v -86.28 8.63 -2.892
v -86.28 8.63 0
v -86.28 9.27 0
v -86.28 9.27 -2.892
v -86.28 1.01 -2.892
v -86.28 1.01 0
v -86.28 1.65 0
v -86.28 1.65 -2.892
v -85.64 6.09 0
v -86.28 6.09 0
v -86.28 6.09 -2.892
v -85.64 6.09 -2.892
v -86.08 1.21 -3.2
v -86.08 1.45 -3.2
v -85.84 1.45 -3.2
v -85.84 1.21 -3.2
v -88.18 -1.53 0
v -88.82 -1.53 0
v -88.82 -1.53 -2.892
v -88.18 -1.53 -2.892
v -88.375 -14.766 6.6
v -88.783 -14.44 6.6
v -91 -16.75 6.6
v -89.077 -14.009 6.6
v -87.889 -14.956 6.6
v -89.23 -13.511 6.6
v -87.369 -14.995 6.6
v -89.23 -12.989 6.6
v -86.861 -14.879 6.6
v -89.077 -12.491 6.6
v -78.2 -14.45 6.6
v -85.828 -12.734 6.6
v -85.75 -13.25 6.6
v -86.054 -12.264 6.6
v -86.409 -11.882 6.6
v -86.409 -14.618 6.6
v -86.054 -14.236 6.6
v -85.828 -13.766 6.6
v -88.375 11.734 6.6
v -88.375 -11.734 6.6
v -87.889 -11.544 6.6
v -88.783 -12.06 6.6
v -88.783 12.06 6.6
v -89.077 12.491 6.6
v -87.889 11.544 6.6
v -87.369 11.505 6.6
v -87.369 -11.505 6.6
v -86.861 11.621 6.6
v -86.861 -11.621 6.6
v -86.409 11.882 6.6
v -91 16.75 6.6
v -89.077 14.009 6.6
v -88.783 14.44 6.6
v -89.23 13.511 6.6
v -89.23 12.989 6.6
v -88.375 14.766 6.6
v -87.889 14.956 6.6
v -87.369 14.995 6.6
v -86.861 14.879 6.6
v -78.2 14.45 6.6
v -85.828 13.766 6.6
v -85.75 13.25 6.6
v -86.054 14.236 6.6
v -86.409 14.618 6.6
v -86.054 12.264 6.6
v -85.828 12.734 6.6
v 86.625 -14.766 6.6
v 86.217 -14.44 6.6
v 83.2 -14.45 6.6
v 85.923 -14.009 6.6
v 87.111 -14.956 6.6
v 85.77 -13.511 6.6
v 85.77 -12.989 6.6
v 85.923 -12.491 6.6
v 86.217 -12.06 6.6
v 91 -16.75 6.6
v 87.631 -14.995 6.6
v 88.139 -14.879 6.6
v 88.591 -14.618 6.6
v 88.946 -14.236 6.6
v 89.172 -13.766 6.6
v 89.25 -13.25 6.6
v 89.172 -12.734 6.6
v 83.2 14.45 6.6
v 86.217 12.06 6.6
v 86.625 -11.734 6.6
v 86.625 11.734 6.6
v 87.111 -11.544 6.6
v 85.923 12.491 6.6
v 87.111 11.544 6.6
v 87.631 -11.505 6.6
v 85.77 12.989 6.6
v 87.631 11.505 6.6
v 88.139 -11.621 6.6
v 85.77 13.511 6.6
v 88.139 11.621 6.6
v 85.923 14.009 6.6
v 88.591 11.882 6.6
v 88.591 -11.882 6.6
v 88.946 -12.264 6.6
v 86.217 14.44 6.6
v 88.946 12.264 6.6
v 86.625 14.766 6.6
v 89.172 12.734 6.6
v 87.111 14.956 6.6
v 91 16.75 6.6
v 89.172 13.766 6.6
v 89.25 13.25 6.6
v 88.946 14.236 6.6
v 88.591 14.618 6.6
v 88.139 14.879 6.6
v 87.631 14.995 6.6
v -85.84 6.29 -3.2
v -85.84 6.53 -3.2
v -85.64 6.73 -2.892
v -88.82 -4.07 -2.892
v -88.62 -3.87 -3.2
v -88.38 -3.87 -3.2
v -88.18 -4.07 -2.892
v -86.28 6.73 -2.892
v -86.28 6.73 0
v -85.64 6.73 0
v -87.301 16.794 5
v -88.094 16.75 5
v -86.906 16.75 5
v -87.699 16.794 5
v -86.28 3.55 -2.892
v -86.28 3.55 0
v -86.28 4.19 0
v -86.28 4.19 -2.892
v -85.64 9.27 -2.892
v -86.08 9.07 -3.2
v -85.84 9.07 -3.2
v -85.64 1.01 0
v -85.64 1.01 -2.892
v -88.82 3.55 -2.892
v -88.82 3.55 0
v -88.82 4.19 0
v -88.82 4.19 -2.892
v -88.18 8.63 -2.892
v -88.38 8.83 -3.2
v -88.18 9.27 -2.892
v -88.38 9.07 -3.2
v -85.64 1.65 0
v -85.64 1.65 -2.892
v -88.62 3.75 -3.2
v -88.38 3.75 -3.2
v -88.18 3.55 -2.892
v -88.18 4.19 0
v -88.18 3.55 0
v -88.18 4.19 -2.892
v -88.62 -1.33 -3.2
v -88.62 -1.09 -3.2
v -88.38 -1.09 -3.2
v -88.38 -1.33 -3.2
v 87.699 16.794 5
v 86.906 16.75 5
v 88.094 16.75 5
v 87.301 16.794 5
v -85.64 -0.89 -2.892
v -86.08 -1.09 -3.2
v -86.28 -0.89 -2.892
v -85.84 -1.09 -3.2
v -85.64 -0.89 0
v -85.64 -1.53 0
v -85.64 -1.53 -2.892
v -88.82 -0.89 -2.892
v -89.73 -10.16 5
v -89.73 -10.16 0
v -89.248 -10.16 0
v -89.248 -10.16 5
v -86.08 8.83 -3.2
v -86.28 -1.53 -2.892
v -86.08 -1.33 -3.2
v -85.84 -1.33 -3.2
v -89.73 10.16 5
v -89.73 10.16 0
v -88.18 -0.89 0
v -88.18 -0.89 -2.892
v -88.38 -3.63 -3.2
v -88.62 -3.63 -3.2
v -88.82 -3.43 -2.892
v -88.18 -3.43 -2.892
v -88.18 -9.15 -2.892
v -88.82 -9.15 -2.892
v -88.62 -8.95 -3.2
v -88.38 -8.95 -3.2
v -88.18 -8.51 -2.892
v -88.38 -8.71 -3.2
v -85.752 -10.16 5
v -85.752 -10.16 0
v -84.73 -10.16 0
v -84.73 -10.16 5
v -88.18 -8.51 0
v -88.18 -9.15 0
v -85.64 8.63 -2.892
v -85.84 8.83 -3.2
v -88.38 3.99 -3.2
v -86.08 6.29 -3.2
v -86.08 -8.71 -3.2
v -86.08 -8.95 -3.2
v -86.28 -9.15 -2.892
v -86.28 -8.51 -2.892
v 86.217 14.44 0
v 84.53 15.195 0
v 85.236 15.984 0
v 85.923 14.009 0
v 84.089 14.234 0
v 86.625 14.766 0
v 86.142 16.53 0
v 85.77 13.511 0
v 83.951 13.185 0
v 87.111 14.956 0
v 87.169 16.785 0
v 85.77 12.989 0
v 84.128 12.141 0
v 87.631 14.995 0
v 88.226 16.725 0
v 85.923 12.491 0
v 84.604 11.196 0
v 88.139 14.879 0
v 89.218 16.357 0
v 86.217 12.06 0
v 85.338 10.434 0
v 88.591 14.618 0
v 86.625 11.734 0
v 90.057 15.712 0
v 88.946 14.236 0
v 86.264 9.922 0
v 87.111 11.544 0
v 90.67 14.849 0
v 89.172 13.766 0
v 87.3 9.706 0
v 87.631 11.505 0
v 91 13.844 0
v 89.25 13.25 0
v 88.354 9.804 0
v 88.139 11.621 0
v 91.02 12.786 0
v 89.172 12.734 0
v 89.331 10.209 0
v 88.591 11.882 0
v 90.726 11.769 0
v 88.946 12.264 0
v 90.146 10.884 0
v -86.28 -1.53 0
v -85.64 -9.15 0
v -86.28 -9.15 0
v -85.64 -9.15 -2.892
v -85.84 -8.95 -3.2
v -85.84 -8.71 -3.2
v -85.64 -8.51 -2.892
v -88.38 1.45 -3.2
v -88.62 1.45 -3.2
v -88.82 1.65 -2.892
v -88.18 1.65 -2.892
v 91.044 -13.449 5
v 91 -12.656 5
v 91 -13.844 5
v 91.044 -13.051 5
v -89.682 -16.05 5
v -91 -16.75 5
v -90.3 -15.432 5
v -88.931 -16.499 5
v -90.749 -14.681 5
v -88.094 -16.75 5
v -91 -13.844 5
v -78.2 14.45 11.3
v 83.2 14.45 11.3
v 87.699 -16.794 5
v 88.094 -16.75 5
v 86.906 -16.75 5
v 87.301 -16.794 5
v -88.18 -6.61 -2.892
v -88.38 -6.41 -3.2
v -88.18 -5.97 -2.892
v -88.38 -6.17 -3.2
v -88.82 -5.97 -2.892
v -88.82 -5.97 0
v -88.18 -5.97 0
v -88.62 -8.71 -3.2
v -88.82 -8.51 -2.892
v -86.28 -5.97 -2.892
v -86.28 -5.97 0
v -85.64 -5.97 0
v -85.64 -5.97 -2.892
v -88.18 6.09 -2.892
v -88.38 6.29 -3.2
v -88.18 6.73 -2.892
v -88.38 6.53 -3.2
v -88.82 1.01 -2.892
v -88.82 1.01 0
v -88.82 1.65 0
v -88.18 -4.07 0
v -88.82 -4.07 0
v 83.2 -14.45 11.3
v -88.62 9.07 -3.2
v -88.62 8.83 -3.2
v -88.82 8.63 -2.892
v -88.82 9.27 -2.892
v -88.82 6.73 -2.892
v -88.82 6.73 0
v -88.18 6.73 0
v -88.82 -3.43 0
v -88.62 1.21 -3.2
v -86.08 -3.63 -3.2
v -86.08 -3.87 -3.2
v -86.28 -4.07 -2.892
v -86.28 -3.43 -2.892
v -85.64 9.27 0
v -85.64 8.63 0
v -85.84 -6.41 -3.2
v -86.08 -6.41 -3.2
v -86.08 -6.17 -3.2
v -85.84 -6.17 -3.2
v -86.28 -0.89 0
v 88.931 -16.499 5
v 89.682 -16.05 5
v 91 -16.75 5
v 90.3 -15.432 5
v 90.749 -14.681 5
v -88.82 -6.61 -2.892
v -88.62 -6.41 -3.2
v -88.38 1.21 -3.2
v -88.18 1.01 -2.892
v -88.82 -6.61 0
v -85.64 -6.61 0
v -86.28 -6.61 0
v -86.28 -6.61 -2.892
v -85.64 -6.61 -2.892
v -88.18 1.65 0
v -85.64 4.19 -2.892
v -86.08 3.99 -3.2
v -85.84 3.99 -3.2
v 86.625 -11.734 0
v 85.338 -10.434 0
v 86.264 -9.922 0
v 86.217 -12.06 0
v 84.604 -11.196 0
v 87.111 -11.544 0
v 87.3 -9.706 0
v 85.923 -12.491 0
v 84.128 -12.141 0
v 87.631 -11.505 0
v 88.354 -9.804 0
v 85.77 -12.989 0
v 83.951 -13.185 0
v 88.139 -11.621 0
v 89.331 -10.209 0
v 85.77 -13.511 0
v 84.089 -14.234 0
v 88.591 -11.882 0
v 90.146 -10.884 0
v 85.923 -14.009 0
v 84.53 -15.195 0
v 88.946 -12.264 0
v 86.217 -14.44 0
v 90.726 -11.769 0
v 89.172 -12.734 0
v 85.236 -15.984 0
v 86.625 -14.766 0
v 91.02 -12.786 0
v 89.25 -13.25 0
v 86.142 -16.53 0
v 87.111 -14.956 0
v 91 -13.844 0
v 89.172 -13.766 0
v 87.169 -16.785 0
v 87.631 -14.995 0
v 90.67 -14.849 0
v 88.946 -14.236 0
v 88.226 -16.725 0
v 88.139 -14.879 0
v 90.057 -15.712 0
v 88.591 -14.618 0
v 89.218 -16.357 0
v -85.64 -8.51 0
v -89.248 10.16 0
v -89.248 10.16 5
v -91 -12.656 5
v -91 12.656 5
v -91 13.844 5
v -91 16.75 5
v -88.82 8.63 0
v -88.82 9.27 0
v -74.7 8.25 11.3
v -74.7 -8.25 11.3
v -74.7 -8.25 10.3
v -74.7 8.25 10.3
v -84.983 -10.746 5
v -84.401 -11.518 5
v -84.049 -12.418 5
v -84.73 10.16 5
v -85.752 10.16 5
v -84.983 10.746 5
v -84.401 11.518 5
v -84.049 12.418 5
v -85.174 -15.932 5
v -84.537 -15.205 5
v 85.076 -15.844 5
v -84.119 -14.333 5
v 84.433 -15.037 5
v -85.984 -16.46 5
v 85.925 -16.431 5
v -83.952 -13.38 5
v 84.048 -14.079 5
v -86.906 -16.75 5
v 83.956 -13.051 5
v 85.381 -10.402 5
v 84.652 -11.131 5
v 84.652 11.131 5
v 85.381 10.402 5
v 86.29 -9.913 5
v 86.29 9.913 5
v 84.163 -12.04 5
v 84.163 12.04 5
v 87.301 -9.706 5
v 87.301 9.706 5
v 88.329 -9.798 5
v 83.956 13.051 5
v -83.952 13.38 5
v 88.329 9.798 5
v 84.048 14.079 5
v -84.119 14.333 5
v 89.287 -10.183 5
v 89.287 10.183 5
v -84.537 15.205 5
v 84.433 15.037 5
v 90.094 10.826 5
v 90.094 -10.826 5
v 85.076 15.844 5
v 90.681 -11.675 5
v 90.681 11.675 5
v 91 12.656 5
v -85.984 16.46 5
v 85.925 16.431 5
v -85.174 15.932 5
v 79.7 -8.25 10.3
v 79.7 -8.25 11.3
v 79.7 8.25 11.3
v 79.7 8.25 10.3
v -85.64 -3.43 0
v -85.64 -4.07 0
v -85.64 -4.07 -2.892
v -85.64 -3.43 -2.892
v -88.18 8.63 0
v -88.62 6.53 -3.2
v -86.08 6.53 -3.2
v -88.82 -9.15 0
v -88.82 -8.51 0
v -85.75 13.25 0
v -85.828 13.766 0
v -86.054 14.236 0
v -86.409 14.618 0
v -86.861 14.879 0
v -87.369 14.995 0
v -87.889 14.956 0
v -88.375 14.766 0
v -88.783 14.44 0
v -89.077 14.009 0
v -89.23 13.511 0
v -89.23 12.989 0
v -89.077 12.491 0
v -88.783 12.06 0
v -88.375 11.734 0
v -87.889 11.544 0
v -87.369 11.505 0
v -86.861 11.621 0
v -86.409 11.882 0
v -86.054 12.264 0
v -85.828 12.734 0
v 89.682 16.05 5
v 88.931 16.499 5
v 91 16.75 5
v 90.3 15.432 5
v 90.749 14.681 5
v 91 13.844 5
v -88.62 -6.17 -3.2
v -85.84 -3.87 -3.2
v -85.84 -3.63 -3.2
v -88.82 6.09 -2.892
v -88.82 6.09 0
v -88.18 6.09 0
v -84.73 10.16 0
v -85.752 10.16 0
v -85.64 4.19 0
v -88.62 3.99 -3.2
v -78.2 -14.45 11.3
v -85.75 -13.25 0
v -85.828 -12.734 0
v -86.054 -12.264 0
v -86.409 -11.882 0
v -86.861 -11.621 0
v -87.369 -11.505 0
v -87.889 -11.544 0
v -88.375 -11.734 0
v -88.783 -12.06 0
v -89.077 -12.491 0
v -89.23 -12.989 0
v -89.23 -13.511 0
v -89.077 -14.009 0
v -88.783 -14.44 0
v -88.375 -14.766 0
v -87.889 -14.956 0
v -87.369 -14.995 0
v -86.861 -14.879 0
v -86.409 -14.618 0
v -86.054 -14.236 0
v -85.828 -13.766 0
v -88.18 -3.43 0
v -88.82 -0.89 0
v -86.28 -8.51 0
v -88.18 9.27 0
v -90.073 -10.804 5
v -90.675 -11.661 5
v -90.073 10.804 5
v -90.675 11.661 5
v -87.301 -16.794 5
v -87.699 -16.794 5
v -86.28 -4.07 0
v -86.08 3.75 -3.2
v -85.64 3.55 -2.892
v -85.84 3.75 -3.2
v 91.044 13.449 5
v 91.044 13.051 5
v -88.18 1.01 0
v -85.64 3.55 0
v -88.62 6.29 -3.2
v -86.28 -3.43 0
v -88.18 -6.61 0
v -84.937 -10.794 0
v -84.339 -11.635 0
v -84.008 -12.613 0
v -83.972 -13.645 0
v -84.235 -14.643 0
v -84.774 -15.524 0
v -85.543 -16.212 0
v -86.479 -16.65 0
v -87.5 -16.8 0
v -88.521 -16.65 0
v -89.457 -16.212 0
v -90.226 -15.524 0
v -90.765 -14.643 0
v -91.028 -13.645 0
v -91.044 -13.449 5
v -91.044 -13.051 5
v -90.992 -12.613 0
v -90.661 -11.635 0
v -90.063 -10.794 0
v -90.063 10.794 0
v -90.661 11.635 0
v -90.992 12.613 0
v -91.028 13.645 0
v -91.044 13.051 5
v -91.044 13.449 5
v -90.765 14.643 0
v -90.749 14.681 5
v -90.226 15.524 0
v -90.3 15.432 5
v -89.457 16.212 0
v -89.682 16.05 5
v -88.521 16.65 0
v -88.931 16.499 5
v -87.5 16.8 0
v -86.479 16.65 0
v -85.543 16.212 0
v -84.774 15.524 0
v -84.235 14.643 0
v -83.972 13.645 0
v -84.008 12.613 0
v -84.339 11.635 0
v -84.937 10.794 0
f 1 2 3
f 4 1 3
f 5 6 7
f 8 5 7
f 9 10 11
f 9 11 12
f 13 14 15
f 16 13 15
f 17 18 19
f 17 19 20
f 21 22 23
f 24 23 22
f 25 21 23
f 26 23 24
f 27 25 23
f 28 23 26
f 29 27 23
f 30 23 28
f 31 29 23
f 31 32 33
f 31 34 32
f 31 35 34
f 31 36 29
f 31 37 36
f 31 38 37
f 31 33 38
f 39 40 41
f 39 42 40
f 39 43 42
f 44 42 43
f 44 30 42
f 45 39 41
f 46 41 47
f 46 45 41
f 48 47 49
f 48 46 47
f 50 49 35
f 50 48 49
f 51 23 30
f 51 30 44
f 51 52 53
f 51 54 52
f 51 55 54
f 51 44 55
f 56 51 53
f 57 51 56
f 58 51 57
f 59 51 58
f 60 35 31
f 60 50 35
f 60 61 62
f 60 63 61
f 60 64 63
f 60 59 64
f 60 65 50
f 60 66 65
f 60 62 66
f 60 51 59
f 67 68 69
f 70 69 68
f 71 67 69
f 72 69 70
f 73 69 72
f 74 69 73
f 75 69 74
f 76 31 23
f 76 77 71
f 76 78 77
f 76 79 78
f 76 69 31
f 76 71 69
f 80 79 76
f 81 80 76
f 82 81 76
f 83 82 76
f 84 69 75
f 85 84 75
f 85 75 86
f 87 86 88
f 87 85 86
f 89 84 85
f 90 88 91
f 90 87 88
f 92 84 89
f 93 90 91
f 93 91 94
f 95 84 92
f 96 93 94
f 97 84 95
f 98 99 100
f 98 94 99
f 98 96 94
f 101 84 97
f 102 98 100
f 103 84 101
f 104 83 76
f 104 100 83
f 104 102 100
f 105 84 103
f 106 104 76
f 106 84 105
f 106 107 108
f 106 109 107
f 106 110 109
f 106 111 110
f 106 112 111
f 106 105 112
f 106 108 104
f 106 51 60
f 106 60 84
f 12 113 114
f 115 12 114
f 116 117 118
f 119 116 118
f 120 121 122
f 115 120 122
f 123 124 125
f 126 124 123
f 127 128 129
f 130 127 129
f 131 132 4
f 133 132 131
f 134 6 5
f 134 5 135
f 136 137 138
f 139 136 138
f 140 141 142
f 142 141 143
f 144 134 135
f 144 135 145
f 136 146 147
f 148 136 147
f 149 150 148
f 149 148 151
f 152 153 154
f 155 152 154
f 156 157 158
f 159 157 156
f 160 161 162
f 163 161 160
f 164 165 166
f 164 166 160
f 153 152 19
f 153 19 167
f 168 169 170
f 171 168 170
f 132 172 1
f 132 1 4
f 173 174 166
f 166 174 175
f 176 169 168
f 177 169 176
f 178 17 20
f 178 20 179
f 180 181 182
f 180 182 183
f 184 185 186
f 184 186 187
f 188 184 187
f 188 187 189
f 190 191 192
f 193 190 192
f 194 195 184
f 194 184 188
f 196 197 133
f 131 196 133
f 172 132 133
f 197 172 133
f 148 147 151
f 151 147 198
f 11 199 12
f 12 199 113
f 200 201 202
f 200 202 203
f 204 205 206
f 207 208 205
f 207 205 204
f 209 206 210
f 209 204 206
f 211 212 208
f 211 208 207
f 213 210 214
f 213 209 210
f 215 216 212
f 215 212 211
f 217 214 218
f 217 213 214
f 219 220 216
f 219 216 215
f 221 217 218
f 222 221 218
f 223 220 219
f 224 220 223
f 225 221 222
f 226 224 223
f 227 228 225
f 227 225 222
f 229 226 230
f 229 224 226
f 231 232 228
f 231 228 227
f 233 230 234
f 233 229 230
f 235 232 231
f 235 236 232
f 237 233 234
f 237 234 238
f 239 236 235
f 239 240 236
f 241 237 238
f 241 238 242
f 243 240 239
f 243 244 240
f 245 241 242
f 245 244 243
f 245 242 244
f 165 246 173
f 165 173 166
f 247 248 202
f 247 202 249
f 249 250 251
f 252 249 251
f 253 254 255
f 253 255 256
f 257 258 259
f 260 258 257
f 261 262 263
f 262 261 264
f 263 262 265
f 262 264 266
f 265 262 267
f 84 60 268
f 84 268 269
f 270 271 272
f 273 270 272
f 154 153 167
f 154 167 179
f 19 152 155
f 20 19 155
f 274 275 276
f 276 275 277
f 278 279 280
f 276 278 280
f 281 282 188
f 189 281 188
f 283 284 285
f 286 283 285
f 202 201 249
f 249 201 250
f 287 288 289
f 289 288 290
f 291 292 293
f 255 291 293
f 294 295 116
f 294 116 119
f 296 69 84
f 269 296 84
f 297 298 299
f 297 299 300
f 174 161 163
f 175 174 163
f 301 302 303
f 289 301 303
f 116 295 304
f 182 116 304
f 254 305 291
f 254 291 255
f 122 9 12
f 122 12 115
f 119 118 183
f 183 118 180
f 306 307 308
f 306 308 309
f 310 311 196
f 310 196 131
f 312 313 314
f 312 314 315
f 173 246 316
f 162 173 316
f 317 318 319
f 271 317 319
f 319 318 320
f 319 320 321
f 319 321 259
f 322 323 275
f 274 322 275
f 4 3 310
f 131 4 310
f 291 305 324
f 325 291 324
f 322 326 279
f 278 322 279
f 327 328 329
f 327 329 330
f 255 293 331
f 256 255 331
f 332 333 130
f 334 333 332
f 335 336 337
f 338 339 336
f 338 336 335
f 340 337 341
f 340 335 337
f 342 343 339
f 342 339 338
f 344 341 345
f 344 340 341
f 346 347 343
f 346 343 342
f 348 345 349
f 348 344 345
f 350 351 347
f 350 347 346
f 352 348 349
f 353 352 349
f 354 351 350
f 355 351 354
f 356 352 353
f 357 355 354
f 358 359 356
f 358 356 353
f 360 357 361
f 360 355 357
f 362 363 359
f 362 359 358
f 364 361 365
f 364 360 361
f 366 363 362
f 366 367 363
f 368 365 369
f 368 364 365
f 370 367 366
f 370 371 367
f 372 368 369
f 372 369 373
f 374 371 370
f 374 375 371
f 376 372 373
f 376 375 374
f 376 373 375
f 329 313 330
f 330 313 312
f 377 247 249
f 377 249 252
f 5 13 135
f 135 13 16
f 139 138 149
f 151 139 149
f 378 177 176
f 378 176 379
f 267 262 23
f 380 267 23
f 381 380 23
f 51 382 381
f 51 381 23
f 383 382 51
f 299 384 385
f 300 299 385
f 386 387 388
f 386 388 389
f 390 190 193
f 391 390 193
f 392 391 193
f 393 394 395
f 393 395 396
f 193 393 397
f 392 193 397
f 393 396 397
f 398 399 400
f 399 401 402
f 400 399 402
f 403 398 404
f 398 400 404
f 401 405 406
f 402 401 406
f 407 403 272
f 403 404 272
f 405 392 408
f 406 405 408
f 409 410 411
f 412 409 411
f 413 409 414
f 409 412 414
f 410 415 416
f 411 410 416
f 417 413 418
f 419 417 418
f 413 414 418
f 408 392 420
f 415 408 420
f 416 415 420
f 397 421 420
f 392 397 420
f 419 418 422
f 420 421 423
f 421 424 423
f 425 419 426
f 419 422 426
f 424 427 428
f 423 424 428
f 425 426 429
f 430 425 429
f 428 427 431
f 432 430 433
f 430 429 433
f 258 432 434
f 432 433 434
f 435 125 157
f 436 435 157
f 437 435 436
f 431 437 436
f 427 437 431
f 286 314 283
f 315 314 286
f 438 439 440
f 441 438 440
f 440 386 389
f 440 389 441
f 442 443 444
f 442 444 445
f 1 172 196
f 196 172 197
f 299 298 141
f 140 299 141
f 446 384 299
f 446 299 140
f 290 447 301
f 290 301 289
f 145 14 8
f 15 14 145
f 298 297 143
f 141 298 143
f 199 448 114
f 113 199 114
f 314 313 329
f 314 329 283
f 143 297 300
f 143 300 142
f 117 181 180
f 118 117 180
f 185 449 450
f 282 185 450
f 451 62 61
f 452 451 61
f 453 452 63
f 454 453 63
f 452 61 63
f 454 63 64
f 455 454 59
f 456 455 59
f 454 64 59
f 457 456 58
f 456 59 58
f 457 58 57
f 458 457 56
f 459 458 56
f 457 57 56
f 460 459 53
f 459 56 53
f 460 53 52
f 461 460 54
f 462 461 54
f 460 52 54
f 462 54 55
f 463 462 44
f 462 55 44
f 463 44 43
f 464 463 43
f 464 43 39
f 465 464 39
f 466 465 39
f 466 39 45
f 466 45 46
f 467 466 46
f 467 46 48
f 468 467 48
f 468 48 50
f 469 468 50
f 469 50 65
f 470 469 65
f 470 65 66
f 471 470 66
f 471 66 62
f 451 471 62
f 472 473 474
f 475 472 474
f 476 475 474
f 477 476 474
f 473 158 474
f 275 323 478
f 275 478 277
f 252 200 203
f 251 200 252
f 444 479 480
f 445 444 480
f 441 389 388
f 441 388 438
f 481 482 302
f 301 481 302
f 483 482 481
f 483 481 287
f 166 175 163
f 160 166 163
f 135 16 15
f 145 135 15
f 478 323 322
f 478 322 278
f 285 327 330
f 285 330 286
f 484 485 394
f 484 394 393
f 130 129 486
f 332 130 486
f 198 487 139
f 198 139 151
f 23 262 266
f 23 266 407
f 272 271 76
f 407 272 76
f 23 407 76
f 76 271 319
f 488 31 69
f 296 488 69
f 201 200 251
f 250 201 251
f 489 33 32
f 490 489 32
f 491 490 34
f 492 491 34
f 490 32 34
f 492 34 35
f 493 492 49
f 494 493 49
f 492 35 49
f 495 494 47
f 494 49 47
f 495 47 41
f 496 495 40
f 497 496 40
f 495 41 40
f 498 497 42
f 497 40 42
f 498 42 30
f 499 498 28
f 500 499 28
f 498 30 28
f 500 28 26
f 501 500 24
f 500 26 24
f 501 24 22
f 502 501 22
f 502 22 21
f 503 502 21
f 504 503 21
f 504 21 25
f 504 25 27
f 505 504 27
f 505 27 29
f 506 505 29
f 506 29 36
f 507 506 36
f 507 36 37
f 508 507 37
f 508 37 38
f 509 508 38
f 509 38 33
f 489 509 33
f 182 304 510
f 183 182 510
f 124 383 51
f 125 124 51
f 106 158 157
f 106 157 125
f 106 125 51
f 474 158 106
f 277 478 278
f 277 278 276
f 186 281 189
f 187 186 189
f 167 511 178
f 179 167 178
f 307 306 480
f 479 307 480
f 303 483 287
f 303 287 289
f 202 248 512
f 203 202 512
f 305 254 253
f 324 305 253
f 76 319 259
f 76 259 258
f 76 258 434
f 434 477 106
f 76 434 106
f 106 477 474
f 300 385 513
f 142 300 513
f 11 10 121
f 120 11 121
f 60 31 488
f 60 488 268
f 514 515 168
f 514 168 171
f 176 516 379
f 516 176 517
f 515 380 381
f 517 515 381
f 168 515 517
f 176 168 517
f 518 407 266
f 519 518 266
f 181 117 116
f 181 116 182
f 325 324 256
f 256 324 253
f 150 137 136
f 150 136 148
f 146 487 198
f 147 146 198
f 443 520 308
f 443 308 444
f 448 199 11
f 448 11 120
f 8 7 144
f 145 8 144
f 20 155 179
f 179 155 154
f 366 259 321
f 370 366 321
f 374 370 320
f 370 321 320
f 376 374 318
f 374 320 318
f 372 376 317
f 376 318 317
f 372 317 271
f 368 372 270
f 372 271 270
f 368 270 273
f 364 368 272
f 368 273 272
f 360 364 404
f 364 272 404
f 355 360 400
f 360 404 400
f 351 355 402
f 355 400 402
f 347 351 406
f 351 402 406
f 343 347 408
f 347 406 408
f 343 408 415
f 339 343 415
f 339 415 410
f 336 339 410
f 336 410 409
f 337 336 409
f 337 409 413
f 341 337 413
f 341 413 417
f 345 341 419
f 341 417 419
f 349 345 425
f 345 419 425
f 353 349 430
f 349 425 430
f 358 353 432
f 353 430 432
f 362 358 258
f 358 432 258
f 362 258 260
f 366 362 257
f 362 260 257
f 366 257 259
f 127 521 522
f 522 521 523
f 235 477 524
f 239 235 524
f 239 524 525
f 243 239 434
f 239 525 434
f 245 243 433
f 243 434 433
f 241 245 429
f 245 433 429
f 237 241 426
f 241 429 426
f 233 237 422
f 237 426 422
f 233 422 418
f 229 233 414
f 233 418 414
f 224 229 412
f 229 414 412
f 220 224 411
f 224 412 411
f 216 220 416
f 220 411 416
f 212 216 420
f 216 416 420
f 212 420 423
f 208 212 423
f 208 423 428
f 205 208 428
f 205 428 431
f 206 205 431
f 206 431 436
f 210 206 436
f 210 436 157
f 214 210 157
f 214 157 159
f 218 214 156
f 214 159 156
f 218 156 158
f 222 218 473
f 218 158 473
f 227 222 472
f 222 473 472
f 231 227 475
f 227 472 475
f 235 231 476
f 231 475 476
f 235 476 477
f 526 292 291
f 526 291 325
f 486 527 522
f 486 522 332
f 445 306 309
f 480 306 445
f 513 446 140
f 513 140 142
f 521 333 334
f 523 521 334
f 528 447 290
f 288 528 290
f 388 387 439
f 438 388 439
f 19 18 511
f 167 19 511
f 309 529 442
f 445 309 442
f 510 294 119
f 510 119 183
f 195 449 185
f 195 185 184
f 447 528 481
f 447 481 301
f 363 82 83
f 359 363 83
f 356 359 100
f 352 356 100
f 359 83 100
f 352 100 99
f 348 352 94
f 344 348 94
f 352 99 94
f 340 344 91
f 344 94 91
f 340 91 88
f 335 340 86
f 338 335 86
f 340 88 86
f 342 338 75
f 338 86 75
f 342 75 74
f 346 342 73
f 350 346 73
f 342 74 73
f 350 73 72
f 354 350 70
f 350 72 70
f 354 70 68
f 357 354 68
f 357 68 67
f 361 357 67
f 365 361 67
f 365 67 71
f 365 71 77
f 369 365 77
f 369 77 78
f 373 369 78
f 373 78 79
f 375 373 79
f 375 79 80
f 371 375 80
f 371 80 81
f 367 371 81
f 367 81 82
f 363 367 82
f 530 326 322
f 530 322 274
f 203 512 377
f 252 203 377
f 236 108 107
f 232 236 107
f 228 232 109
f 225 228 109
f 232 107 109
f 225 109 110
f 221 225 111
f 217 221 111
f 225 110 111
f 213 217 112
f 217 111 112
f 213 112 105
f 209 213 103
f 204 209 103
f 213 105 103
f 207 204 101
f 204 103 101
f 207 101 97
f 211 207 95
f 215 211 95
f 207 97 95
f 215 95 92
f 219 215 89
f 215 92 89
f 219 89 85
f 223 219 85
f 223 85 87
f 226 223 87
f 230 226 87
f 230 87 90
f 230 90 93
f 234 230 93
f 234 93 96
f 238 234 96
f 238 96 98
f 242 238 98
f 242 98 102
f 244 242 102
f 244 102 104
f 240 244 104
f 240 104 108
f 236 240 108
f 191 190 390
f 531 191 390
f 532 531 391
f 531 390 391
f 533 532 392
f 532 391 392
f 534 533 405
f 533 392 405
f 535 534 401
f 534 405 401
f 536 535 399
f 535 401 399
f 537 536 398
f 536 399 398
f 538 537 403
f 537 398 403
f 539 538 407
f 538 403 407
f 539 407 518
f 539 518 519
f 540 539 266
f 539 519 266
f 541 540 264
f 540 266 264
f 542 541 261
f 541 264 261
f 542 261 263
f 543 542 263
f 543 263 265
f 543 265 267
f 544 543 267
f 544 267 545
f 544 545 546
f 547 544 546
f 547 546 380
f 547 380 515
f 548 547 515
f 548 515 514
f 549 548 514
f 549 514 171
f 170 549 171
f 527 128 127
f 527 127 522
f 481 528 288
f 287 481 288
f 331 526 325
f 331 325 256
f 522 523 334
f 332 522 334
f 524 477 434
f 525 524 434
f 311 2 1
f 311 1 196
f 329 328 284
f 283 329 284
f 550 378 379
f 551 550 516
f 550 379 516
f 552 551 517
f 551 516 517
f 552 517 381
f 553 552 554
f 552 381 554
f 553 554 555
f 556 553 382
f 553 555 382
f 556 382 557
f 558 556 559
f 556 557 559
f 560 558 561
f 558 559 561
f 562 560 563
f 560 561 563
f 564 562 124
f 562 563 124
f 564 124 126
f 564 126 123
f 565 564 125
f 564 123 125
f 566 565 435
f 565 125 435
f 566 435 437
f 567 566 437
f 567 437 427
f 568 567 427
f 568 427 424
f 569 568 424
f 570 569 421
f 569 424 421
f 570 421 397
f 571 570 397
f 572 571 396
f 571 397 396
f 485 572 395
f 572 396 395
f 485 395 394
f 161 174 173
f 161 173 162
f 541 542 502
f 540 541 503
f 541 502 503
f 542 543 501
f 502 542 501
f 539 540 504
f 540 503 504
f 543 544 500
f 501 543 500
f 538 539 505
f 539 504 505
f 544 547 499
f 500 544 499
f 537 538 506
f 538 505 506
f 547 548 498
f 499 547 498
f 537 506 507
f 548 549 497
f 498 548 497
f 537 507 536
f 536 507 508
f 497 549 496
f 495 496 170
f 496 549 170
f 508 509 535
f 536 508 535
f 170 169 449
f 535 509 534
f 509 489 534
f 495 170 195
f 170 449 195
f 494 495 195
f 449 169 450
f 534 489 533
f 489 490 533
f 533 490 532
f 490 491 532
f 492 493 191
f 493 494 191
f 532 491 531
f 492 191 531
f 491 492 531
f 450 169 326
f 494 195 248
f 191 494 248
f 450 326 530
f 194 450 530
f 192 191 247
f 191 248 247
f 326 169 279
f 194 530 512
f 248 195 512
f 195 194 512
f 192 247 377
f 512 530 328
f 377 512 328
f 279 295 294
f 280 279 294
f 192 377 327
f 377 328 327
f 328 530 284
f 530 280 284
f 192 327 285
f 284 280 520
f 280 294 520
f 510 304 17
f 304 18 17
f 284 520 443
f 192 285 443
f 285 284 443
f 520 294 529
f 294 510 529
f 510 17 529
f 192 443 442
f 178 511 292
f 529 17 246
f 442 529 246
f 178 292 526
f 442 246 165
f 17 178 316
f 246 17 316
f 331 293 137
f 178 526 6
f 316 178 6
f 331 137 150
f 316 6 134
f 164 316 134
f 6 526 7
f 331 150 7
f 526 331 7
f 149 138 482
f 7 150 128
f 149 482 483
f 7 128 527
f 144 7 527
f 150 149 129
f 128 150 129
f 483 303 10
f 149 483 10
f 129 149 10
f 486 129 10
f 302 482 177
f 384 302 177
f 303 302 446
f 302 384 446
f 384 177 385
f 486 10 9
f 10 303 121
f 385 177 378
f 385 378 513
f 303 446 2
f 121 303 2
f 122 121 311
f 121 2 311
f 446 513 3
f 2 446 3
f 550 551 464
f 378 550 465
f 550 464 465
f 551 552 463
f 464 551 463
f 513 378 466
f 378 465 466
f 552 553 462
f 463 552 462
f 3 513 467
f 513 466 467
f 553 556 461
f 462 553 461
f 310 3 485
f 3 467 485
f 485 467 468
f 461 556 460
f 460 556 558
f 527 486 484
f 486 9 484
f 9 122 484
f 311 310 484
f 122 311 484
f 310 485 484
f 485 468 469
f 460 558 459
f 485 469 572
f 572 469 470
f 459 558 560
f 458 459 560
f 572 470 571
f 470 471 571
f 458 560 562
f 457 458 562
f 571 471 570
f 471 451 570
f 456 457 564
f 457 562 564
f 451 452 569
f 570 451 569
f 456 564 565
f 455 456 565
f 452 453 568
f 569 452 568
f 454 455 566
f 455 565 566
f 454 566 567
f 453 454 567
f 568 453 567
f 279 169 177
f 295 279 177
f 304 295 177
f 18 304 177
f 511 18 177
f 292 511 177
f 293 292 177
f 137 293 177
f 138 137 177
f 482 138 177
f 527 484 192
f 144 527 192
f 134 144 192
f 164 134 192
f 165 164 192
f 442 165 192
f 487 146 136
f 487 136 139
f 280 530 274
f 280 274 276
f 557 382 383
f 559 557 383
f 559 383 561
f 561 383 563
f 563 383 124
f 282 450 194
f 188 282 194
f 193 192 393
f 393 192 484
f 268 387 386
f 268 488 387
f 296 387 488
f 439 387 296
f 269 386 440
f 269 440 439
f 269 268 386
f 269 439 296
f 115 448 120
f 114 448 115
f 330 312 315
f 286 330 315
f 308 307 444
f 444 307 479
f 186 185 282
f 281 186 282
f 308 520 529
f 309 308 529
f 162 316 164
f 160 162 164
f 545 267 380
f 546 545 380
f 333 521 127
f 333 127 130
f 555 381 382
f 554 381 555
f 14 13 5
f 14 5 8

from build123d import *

# Parameters (mm, degrees)
SKETCH_2_W                          = 182
SKETCH_2_H                          = 33.5
EXTRUDE_1_DEPTH                     = 1.6
SKETCH_3_W                          = 161.4
SKETCH_3_H                          = 28.9
EXTRUDE_2_DEPTH                     = 4.7
SKETCH_4_W                          = 154.4
SKETCH_4_H                          = 16.5
CUT_EXTRUDE_1_DEPTH                 = 1
SKETCH_6_R                          = 3.55
EXTRUDE_3_DEPTH                     = 5
SKETCH_5_R                          = 1.75
CUT_EXTRUDE_2_DEPTH                 = 93.821885889
SKETCH_7_W                          = 0.64
SKETCH_7_H                          = 0.64
EXTRUDE_4_DEPTH                     = 3.2
CHAMFER_1_SIZE                      = 0.2
CHAMFER_1_SIZE2                     = 0.307972993
SKETCH_9_W                          = 5
SKETCH_9_H                          = 20.32
EXTRUDE_5_DEPTH                     = 5
PATTERN_LINEAR_6_COUNT              = 8
PATTERN_LINEAR_6_PITCH              = 2.54
PATTERN_LINEAR_6_COUNT_DIR2         = 2
PATTERN_LINEAR_6_PITCH_DIR2         = 2.54
CHAMFER_1_OF_PATTERN_LINEAR_6_SIZE2 = 0.2
CHAMFER_1_OF_PATTERN_LINEAR_6_SIZE  = 0.307972993


with BuildPart() as part:
    # Эскиз2 → Бобышка-Вытянуть1 (new body)
    with BuildSketch(Plane.XY.offset(5)):
        Rectangle(SKETCH_2_W, SKETCH_2_H)
    extrude(amount=EXTRUDE_1_DEPTH)

    # Эскиз3 → Бобышка-Вытянуть2 (add)
    with BuildSketch(Plane.XY.offset(6.6)):
        with Locations((2.5, 0)):
            Rectangle(SKETCH_3_W, SKETCH_3_H)
    extrude(amount=EXTRUDE_2_DEPTH)

    # Эскиз4 → Вырез-Вытянуть1 (cut)
    with BuildSketch(Plane.XY.offset(11.3)):
        with Locations((2.5, 0)):
            Rectangle(SKETCH_4_W, SKETCH_4_H)
    extrude(amount=-CUT_EXTRUDE_1_DEPTH, mode=Mode.SUBTRACT)

    # Эскиз6 → Бобышка-Вытянуть3 (add)
    with BuildSketch(Plane(origin=(0, 0, 5), x_dir=(-1, 0, 0), z_dir=(0, 0, -1))):
        with Locations(Location((-87.5, -13.25, 0), (0, 0, 189.627632683))):
            Circle(SKETCH_6_R)
        with Locations(Location((-87.5, 13.25, 0), (0, 0, 170.372367317))):
            Circle(SKETCH_6_R)
        with Locations(Location((87.5, 13.25, 0), (0, 0, 99.627632683))):
            Circle(SKETCH_6_R)
        with Locations(Location((87.5, -13.25, 0), (0, 0, 260.372367317))):
            Circle(SKETCH_6_R)
    extrude(amount=EXTRUDE_3_DEPTH)

    # Эскиз5 → Вырез-Вытянуть2 (cut, through all)
    with BuildSketch(Plane.XY.offset(6.6)):
        with Locations((-87.5, 13.25)):
            Circle(SKETCH_5_R)
        with Locations((-87.5, -13.25)):
            Circle(SKETCH_5_R)
        with Locations((87.5, -13.25)):
            Circle(SKETCH_5_R)
        with Locations((87.5, 13.25)):
            Circle(SKETCH_5_R)
    extrude(amount=-CUT_EXTRUDE_2_DEPTH, mode=Mode.SUBTRACT)



with BuildPart() as body_2:
    # Эскиз7 → Бобышка-Вытянуть4 (new body)
    with BuildSketch(Plane.XY):
        with Locations((-88.5, -8.83)):
            Rectangle(SKETCH_7_W, SKETCH_7_H)
    extrude_4 = extrude(amount=-EXTRUDE_4_DEPTH)

    # Фаска1
    chamfer_1_edges = [body_2.edges().sort_by_distance(p)[0] for p in [
        (-88.18, -8.83, -3.2),
        (-88.5, -8.51, -3.2),
        (-88.82, -8.83, -3.2),
        (-88.5, -9.15, -3.2),
    ]]
    chamfer_1_side = [body_2.faces().sort_by_distance(p)[0] for p in [
        (-88.5, -8.83, -3.2),
    ]]
    chamfer(chamfer_1_edges, length=CHAMFER_1_SIZE, length2=CHAMFER_1_SIZE2, reference=chamfer_1_side[0])


with BuildPart() as part_1:
    add(part.part)

    add(body_2.part)  # Бобышка-Вытянуть5 merges body 2
    # Эскиз9 → Бобышка-Вытянуть5 (add)
    with BuildSketch(Plane.XY):
        with Locations((-87.23, 0)):
            Rectangle(SKETCH_9_W, SKETCH_9_H)
    extrude(amount=EXTRUDE_5_DEPTH)

    # Линейный массив6: Extrude 4 8 × 2
    with Locations(*[(j * PATTERN_LINEAR_6_PITCH_DIR2, i * PATTERN_LINEAR_6_PITCH, 0) for i in range(PATTERN_LINEAR_6_COUNT) for j in range(PATTERN_LINEAR_6_COUNT_DIR2) if (i, j) != (0, 0)]):
        add(extrude_4)

    # Фаска1 of Линейный массив6
    chamfer_1_of_pattern_linear_6_edges = [part_1.edges().sort_by_distance(p)[0] for p in [
        (-85.64, -8.83, -3.2),
        (-85.96, -8.51, -3.2),
        (-86.28, -8.83, -3.2),
        (-85.96, -9.15, -3.2),
        (-88.18, -6.29, -3.2),
        (-88.5, -5.97, -3.2),
        (-88.82, -6.29, -3.2),
        (-88.5, -6.61, -3.2),
        (-85.64, -6.29, -3.2),
        (-85.96, -5.97, -3.2),
        (-86.28, -6.29, -3.2),
        (-85.96, -6.61, -3.2),
        (-88.18, -3.75, -3.2),
        (-88.5, -3.43, -3.2),
        (-88.82, -3.75, -3.2),
        (-88.5, -4.07, -3.2),
        (-85.64, -3.75, -3.2),
        (-85.96, -3.43, -3.2),
        (-86.28, -3.75, -3.2),
        (-85.96, -4.07, -3.2),
        (-88.18, -1.21, -3.2),
        (-88.5, -0.89, -3.2),
        (-88.82, -1.21, -3.2),
        (-88.5, -1.53, -3.2),
        (-85.64, -1.21, -3.2),
        (-85.96, -0.89, -3.2),
        (-86.28, -1.21, -3.2),
        (-85.96, -1.53, -3.2),
        (-88.18, 1.33, -3.2),
        (-88.5, 1.65, -3.2),
        (-88.82, 1.33, -3.2),
        (-88.5, 1.01, -3.2),
        (-85.64, 1.33, -3.2),
        (-85.96, 1.65, -3.2),
        (-86.28, 1.33, -3.2),
        (-85.96, 1.01, -3.2),
        (-88.18, 3.87, -3.2),
        (-88.5, 4.19, -3.2),
        (-88.82, 3.87, -3.2),
        (-88.5, 3.55, -3.2),
        (-85.64, 3.87, -3.2),
        (-85.96, 4.19, -3.2),
        (-86.28, 3.87, -3.2),
        (-85.96, 3.55, -3.2),
        (-88.18, 6.41, -3.2),
        (-88.5, 6.73, -3.2),
        (-88.82, 6.41, -3.2),
        (-88.5, 6.09, -3.2),
        (-85.64, 6.41, -3.2),
        (-85.96, 6.73, -3.2),
        (-86.28, 6.41, -3.2),
        (-85.96, 6.09, -3.2),
        (-88.18, 8.95, -3.2),
        (-88.5, 9.27, -3.2),
        (-88.82, 8.95, -3.2),
        (-88.5, 8.63, -3.2),
        (-85.64, 8.95, -3.2),
        (-85.96, 9.27, -3.2),
        (-86.28, 8.95, -3.2),
        (-85.96, 8.63, -3.2),
    ]]
    chamfer(chamfer_1_of_pattern_linear_6_edges, length=CHAMFER_1_OF_PATTERN_LINEAR_6_SIZE, length2=CHAMFER_1_OF_PATTERN_LINEAR_6_SIZE2)


solid = part_1.part
